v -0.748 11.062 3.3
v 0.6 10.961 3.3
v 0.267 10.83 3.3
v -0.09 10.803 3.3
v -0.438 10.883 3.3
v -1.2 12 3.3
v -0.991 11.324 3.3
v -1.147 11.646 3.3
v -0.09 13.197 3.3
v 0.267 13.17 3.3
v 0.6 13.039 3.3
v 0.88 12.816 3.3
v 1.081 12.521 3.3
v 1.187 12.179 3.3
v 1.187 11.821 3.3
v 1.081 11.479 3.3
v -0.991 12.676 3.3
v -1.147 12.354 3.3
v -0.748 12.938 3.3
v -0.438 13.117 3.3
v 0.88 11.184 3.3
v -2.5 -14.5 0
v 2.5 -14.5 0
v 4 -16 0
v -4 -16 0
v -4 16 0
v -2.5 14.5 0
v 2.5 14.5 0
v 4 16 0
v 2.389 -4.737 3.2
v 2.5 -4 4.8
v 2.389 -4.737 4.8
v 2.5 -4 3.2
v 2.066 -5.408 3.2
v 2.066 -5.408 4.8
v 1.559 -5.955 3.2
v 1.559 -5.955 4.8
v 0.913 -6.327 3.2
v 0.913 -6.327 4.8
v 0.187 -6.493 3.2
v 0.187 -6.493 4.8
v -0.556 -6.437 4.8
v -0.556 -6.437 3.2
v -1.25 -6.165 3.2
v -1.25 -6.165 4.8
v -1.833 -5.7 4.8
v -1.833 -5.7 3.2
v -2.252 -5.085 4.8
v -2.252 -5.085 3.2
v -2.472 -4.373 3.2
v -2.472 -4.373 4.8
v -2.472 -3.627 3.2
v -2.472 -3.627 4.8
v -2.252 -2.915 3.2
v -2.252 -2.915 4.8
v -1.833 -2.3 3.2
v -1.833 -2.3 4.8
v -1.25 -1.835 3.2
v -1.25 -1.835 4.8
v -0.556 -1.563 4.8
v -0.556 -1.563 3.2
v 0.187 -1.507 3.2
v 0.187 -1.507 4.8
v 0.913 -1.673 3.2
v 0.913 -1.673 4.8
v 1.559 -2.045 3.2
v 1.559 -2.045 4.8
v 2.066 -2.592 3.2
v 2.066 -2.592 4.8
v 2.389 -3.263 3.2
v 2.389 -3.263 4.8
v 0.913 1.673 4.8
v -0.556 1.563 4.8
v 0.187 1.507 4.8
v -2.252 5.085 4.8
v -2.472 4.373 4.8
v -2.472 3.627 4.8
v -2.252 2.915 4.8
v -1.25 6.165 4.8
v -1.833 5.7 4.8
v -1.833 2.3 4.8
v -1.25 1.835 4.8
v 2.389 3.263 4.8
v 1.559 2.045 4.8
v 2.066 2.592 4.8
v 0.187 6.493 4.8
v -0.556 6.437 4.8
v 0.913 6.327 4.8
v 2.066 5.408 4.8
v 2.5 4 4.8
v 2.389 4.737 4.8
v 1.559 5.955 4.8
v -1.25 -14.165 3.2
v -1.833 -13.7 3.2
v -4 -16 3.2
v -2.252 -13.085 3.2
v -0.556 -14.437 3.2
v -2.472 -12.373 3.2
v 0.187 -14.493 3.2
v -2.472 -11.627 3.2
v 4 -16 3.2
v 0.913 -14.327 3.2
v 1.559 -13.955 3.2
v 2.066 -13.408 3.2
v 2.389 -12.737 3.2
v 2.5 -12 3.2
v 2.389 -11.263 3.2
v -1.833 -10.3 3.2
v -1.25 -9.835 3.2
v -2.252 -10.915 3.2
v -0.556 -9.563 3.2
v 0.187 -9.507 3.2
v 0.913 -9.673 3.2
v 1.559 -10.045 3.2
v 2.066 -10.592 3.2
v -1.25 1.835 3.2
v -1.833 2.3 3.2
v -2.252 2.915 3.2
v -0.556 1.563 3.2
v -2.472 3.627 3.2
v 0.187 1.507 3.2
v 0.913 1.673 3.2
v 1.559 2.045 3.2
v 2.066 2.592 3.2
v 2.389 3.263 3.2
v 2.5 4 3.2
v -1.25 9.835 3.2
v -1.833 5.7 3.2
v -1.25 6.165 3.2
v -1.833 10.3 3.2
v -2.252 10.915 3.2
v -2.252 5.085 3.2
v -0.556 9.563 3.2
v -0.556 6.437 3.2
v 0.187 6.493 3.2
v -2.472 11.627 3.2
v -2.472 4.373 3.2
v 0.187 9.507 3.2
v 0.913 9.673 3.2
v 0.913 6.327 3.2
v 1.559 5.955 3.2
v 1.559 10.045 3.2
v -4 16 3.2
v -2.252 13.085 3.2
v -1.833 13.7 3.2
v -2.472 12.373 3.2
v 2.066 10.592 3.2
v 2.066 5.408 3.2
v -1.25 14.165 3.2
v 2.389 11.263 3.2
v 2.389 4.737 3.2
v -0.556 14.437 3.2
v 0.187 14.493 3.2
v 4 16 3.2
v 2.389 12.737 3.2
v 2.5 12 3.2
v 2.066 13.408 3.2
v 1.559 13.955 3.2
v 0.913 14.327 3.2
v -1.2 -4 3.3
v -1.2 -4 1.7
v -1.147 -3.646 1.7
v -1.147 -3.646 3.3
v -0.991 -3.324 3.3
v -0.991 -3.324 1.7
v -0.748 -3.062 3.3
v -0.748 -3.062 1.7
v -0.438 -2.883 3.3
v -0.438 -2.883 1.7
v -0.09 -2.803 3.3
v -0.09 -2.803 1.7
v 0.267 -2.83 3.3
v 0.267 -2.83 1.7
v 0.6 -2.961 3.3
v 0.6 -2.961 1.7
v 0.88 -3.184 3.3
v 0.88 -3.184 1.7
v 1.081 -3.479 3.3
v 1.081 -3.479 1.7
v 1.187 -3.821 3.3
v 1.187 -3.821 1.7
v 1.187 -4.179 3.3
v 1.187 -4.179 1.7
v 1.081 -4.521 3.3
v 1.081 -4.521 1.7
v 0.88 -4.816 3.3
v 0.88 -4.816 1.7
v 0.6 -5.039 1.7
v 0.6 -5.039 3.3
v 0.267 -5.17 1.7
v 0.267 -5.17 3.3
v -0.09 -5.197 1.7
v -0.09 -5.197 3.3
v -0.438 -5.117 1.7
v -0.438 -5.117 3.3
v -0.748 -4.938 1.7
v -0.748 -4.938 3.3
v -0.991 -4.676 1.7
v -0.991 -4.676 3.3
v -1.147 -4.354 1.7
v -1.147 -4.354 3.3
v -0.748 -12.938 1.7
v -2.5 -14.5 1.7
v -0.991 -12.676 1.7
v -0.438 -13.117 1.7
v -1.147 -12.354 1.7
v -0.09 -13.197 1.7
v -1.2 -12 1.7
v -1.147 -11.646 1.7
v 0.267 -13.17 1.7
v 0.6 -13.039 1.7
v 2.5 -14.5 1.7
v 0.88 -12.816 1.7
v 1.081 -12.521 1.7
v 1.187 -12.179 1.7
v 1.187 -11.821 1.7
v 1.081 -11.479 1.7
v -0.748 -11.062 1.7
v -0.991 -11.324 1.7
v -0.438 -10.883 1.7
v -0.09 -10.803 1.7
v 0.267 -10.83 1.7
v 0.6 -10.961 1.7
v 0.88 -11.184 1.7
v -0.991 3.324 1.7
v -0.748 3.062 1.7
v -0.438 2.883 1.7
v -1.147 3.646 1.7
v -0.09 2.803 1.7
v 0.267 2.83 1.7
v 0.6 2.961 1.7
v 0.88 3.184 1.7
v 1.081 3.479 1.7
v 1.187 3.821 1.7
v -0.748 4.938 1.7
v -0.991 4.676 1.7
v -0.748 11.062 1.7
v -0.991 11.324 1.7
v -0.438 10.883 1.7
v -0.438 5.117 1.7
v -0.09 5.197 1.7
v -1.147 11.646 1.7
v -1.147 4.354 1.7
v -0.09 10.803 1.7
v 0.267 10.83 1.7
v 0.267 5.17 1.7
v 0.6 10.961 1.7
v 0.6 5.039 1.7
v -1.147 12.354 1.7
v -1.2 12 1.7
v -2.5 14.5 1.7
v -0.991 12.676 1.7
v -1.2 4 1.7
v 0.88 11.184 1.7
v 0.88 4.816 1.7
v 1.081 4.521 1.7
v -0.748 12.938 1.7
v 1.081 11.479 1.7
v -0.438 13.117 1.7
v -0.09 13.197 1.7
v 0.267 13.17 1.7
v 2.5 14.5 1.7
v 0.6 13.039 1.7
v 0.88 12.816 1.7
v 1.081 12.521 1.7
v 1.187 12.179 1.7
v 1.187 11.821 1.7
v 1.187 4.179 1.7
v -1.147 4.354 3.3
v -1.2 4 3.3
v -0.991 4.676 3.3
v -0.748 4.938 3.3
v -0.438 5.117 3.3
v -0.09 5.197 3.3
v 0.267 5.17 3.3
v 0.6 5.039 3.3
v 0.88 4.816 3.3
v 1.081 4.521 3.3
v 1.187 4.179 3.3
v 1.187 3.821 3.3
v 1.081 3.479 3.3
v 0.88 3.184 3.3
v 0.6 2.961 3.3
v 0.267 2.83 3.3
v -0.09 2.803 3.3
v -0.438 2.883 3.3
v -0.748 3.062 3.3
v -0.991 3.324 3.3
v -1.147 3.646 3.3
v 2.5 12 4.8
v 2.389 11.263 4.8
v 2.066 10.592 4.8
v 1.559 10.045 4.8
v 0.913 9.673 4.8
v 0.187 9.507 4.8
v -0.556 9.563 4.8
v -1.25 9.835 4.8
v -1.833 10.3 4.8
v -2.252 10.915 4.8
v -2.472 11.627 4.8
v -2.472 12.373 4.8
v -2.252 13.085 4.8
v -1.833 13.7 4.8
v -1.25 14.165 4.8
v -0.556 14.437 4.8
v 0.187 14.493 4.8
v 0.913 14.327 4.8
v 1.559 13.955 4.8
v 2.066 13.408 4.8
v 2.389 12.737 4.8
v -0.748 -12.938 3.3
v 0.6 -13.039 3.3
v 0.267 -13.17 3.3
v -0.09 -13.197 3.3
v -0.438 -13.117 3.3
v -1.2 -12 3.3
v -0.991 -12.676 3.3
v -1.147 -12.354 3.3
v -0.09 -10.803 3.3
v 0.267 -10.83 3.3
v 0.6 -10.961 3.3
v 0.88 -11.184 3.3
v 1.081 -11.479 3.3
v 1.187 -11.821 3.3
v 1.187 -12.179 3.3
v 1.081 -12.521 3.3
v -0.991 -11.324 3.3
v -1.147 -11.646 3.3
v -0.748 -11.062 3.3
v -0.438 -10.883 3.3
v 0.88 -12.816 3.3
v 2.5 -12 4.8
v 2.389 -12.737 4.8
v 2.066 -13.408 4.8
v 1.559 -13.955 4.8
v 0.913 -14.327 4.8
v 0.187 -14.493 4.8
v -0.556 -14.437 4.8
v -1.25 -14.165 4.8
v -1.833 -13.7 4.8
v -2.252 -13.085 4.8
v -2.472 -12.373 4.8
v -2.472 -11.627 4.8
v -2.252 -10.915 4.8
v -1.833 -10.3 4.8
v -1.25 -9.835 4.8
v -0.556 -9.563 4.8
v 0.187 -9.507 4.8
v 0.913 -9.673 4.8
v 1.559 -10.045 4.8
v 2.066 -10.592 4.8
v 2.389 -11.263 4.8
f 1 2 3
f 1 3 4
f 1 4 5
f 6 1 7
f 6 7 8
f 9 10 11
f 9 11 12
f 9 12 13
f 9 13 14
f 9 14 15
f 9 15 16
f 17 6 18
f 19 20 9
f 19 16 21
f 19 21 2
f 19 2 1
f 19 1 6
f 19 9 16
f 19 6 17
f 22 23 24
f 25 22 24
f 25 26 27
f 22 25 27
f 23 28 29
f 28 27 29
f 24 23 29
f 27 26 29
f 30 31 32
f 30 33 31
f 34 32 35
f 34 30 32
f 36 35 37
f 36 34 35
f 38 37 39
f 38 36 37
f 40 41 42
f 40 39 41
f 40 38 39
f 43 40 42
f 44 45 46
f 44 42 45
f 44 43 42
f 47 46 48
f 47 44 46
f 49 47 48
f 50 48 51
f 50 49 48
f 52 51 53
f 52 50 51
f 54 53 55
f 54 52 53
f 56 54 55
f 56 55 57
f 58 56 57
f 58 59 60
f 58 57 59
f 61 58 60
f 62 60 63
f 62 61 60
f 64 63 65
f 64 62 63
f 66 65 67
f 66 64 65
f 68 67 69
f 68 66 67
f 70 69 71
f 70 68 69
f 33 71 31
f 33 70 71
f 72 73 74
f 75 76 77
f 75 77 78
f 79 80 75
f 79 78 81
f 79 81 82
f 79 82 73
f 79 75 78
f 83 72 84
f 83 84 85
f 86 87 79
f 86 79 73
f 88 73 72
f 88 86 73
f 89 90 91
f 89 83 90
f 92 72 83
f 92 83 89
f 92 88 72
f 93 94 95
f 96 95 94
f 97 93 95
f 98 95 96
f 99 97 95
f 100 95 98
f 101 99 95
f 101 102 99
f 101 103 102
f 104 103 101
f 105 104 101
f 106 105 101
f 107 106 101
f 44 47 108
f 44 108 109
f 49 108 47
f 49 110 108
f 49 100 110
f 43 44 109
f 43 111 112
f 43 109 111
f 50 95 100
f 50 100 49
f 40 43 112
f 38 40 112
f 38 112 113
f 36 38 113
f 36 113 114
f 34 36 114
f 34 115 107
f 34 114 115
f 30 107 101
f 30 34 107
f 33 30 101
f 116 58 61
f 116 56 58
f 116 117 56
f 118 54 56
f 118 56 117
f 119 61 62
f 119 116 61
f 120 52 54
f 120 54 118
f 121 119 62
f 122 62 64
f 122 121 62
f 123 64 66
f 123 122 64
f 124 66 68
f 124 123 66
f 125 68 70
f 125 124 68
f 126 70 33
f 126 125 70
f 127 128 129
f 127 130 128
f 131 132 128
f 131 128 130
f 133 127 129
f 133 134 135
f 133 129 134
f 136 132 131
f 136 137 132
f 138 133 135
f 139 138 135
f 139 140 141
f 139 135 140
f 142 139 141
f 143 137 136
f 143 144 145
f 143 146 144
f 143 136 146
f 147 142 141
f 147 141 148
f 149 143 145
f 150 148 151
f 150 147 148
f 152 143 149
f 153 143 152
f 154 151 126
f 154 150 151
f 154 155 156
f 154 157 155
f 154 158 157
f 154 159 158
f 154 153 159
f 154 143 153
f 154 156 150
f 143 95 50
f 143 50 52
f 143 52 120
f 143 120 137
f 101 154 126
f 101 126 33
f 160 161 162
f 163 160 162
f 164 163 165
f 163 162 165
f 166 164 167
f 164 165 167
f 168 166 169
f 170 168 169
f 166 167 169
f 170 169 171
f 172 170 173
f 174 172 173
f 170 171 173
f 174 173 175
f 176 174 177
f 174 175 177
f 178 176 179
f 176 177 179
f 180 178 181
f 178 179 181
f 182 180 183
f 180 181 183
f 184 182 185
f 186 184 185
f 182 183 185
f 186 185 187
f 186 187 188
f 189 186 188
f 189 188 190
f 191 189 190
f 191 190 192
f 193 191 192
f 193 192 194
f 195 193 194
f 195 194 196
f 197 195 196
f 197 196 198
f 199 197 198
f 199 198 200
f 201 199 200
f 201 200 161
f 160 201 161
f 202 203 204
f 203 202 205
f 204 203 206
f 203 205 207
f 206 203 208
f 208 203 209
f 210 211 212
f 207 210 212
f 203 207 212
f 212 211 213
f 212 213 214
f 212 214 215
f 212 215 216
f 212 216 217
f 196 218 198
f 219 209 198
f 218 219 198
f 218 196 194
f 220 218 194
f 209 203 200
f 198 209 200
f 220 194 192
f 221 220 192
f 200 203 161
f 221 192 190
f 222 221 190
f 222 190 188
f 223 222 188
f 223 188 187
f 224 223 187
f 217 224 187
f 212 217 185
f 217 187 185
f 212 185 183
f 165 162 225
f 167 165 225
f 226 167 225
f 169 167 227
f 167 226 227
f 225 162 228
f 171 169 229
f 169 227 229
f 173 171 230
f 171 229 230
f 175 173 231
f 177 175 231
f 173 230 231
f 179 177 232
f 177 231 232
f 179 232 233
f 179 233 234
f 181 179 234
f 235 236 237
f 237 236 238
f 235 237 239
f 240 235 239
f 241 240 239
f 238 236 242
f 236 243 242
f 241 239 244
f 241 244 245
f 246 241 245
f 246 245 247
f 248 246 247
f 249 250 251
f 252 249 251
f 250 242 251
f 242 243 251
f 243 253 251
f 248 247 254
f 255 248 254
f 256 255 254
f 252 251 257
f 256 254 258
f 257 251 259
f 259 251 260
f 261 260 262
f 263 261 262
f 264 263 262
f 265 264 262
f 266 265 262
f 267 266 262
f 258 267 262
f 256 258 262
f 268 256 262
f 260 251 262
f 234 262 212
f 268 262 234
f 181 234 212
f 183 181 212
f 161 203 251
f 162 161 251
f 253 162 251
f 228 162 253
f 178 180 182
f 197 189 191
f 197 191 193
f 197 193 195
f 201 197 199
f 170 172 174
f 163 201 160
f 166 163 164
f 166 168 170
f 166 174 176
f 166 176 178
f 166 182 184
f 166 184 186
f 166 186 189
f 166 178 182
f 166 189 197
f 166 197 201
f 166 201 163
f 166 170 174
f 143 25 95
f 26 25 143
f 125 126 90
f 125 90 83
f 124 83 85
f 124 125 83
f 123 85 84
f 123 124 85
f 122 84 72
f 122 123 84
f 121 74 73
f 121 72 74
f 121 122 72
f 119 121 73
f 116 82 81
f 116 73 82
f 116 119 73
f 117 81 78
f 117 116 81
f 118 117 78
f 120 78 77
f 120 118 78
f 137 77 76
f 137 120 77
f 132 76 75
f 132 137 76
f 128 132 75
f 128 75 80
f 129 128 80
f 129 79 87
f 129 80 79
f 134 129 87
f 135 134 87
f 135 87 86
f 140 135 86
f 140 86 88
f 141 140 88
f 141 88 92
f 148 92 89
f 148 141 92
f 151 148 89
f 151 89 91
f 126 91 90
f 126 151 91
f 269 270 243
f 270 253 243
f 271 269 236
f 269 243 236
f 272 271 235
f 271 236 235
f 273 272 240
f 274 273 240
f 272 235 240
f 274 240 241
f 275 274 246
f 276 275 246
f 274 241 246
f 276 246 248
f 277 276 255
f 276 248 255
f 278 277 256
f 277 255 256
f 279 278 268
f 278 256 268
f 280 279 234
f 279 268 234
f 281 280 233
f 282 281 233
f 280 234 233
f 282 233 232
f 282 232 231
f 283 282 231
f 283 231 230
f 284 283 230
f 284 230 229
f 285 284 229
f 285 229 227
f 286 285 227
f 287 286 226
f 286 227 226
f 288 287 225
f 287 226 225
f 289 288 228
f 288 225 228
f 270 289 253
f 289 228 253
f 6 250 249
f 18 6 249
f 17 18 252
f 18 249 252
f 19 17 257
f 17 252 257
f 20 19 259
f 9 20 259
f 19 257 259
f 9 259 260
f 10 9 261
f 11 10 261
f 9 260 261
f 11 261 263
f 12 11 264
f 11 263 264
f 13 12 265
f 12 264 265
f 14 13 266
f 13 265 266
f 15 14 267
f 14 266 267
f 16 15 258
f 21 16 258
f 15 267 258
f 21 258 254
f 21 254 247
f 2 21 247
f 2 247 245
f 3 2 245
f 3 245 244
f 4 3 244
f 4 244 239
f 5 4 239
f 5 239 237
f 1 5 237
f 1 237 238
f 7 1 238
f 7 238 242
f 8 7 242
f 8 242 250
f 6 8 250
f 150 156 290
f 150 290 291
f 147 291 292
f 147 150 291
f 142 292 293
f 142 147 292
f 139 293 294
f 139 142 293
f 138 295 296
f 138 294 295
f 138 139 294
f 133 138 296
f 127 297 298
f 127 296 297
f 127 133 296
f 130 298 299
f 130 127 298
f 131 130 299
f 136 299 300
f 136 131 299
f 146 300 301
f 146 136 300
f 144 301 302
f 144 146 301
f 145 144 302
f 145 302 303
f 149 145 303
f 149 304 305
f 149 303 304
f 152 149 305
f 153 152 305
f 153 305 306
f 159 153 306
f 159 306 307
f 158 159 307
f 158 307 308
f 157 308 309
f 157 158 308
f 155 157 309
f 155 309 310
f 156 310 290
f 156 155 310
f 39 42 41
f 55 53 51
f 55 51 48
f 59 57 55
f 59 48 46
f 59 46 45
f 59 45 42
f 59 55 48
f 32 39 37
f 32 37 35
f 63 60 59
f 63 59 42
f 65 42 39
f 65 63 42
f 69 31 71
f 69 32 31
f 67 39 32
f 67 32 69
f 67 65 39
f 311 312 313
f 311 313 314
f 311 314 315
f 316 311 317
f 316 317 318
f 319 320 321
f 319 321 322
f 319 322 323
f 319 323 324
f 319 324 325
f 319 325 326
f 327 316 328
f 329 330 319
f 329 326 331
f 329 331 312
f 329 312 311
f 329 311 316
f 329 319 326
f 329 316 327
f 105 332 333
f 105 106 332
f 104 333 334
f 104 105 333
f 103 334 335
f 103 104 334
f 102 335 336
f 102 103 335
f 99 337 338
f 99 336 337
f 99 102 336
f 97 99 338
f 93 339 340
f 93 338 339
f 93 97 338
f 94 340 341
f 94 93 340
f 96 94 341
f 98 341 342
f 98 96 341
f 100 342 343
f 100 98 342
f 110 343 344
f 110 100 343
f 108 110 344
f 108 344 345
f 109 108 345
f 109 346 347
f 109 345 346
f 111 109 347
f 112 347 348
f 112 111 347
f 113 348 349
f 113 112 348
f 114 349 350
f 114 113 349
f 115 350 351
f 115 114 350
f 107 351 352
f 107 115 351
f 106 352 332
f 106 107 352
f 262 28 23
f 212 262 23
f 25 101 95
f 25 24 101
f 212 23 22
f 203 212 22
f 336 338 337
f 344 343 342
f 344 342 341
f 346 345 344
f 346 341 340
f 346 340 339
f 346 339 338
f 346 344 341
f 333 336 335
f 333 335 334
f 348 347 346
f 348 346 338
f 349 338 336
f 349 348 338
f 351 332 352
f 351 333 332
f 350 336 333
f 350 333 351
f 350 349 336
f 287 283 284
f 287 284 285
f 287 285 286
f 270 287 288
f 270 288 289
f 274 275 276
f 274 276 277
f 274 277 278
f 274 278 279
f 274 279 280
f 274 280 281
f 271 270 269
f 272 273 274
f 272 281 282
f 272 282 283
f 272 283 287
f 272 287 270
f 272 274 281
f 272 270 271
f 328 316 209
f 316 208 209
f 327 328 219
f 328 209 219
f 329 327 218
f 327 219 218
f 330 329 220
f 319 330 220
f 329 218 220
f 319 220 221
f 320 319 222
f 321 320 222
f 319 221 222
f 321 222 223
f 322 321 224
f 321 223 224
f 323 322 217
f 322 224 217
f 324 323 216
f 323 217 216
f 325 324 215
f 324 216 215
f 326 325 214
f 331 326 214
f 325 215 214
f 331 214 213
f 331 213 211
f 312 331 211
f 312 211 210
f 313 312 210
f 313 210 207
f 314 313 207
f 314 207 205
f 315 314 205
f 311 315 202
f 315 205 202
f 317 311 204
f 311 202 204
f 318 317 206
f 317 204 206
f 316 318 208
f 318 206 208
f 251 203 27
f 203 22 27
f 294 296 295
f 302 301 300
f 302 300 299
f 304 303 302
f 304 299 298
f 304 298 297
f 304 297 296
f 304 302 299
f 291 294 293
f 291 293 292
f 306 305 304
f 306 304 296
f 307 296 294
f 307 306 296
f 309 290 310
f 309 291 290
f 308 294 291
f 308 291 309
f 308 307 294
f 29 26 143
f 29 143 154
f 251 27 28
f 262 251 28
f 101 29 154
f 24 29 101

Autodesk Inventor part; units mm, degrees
ref_plane "YZ Plane" through (0, 0, 0) normal (1, 0, 0) x (0, 1, 0)
ref_plane "XZ Plane" through (0, 0, 0) normal (0, 1, 0) x (-1, 0, 0)
ref_plane "XY Plane" through (0, 0, 0) normal (0, 0, 1) x (1, 0, 0)
sketch "Sketch1" plane through (0, 0, 0) normal (0, 0, 1) x (1, 0, 0)
  line L0 (-4, 16) -> (4, 16)
  line L1 (4, 16) -> (4, -16)
  line L2 (4, -16) -> (-4, -16)
  line L3 (-4, -16) -> (-4, 16)
  point P0 (0, 0)
  dimension "d0" = 8
  dimension "d1" = 32
  dimension "d2" = 4
  dimension "d3" = 16
extrude "Extrusion1" add sketch "Sketch1" along normal blind 3.2
shell "Shell1" thickness 1.5 removed faces 1 at (-1.3333, 5.3333, 0)
sketch "Sketch2" plane through (0, 0, 3.2) normal (0, 0, 1) x (1, 0, 0)
  circle A0 centre (0, -12) radius 2.5
  line L0 (4, 16) -> (4, -16) projected
  line L1 (4, -16) -> (-4, -16) projected
  dimension "d7" = 5
  dimension "d10" = 4
  dimension "d11" = 4
extrude "Extrusion2" add sketch "Sketch2" along normal blind 1.6
sketch "Sketch3" plane through (2.5, -14.5, 1.7) normal (0, 0, -1) x (-1, 0, 0)
  circle A0 centre (2.5, 2.5) radius 2.5 projected
  circle A1 centre (2.5, 2.5) radius 1.2
  point P0 (2.5, 14.5)
  dimension "d18" = 2.4
extrude "Extrusion3" cut sketch "Sketch3" against normal blind 1.6 contours A1
pattern_linear "Rectangular Pattern1" count 4 spacing 8 along (0, 1, 0) of "Extrusion2", "Extrusion3"
sketch "Sketch4" plane through (2.5, -14.5, 1.7) normal (0, 0, -1) x (-1, 0, 0)
  circle A0 centre (2.5, 10.5) radius 1.2 projected
  circle A1 centre (2.5, 2.5) radius 1.2 projected
  line L0 (0, 29) -> (0, 0) projected
  line L1 (0, 0) -> (5, 0) projected
  circle A2 centre (6.5, 6.5) radius 3.15
  circle A3 centre (6.5, 6.5) radius 2.5
  point P0 (2.5, 14.5)
  dimension "d21" = 6.5
  dimension "d22" = 6.5
  dimension "d23" = 10.5
  dimension "d24" = 2.5
  dimension "d25" = 5
  dimension "d26" = 6.3
extrude "Extrusion4" [suppressed]
pattern_linear "Rectangular Pattern2" [suppressed]
equation "\"d0\" = 8 * WIDTH"
equation "\"d1\" = 8 * LENGTH"
equation "\"d2\" = 0.5 * d0"
equation "\"d3\" = 0.5 * d1"
equation "\"d4\" = HEIGHT"
equation "\"d21\" = 0.5 * d23 + 0.5 * d24"
equation "\"d22\" = d21"
equation "\"WIDTH\" = 1"
equation "\"HEIGHT\" = 3.2"
equation "\"LENGTH\" = 4"
properties part number "3710" material "Steel"
